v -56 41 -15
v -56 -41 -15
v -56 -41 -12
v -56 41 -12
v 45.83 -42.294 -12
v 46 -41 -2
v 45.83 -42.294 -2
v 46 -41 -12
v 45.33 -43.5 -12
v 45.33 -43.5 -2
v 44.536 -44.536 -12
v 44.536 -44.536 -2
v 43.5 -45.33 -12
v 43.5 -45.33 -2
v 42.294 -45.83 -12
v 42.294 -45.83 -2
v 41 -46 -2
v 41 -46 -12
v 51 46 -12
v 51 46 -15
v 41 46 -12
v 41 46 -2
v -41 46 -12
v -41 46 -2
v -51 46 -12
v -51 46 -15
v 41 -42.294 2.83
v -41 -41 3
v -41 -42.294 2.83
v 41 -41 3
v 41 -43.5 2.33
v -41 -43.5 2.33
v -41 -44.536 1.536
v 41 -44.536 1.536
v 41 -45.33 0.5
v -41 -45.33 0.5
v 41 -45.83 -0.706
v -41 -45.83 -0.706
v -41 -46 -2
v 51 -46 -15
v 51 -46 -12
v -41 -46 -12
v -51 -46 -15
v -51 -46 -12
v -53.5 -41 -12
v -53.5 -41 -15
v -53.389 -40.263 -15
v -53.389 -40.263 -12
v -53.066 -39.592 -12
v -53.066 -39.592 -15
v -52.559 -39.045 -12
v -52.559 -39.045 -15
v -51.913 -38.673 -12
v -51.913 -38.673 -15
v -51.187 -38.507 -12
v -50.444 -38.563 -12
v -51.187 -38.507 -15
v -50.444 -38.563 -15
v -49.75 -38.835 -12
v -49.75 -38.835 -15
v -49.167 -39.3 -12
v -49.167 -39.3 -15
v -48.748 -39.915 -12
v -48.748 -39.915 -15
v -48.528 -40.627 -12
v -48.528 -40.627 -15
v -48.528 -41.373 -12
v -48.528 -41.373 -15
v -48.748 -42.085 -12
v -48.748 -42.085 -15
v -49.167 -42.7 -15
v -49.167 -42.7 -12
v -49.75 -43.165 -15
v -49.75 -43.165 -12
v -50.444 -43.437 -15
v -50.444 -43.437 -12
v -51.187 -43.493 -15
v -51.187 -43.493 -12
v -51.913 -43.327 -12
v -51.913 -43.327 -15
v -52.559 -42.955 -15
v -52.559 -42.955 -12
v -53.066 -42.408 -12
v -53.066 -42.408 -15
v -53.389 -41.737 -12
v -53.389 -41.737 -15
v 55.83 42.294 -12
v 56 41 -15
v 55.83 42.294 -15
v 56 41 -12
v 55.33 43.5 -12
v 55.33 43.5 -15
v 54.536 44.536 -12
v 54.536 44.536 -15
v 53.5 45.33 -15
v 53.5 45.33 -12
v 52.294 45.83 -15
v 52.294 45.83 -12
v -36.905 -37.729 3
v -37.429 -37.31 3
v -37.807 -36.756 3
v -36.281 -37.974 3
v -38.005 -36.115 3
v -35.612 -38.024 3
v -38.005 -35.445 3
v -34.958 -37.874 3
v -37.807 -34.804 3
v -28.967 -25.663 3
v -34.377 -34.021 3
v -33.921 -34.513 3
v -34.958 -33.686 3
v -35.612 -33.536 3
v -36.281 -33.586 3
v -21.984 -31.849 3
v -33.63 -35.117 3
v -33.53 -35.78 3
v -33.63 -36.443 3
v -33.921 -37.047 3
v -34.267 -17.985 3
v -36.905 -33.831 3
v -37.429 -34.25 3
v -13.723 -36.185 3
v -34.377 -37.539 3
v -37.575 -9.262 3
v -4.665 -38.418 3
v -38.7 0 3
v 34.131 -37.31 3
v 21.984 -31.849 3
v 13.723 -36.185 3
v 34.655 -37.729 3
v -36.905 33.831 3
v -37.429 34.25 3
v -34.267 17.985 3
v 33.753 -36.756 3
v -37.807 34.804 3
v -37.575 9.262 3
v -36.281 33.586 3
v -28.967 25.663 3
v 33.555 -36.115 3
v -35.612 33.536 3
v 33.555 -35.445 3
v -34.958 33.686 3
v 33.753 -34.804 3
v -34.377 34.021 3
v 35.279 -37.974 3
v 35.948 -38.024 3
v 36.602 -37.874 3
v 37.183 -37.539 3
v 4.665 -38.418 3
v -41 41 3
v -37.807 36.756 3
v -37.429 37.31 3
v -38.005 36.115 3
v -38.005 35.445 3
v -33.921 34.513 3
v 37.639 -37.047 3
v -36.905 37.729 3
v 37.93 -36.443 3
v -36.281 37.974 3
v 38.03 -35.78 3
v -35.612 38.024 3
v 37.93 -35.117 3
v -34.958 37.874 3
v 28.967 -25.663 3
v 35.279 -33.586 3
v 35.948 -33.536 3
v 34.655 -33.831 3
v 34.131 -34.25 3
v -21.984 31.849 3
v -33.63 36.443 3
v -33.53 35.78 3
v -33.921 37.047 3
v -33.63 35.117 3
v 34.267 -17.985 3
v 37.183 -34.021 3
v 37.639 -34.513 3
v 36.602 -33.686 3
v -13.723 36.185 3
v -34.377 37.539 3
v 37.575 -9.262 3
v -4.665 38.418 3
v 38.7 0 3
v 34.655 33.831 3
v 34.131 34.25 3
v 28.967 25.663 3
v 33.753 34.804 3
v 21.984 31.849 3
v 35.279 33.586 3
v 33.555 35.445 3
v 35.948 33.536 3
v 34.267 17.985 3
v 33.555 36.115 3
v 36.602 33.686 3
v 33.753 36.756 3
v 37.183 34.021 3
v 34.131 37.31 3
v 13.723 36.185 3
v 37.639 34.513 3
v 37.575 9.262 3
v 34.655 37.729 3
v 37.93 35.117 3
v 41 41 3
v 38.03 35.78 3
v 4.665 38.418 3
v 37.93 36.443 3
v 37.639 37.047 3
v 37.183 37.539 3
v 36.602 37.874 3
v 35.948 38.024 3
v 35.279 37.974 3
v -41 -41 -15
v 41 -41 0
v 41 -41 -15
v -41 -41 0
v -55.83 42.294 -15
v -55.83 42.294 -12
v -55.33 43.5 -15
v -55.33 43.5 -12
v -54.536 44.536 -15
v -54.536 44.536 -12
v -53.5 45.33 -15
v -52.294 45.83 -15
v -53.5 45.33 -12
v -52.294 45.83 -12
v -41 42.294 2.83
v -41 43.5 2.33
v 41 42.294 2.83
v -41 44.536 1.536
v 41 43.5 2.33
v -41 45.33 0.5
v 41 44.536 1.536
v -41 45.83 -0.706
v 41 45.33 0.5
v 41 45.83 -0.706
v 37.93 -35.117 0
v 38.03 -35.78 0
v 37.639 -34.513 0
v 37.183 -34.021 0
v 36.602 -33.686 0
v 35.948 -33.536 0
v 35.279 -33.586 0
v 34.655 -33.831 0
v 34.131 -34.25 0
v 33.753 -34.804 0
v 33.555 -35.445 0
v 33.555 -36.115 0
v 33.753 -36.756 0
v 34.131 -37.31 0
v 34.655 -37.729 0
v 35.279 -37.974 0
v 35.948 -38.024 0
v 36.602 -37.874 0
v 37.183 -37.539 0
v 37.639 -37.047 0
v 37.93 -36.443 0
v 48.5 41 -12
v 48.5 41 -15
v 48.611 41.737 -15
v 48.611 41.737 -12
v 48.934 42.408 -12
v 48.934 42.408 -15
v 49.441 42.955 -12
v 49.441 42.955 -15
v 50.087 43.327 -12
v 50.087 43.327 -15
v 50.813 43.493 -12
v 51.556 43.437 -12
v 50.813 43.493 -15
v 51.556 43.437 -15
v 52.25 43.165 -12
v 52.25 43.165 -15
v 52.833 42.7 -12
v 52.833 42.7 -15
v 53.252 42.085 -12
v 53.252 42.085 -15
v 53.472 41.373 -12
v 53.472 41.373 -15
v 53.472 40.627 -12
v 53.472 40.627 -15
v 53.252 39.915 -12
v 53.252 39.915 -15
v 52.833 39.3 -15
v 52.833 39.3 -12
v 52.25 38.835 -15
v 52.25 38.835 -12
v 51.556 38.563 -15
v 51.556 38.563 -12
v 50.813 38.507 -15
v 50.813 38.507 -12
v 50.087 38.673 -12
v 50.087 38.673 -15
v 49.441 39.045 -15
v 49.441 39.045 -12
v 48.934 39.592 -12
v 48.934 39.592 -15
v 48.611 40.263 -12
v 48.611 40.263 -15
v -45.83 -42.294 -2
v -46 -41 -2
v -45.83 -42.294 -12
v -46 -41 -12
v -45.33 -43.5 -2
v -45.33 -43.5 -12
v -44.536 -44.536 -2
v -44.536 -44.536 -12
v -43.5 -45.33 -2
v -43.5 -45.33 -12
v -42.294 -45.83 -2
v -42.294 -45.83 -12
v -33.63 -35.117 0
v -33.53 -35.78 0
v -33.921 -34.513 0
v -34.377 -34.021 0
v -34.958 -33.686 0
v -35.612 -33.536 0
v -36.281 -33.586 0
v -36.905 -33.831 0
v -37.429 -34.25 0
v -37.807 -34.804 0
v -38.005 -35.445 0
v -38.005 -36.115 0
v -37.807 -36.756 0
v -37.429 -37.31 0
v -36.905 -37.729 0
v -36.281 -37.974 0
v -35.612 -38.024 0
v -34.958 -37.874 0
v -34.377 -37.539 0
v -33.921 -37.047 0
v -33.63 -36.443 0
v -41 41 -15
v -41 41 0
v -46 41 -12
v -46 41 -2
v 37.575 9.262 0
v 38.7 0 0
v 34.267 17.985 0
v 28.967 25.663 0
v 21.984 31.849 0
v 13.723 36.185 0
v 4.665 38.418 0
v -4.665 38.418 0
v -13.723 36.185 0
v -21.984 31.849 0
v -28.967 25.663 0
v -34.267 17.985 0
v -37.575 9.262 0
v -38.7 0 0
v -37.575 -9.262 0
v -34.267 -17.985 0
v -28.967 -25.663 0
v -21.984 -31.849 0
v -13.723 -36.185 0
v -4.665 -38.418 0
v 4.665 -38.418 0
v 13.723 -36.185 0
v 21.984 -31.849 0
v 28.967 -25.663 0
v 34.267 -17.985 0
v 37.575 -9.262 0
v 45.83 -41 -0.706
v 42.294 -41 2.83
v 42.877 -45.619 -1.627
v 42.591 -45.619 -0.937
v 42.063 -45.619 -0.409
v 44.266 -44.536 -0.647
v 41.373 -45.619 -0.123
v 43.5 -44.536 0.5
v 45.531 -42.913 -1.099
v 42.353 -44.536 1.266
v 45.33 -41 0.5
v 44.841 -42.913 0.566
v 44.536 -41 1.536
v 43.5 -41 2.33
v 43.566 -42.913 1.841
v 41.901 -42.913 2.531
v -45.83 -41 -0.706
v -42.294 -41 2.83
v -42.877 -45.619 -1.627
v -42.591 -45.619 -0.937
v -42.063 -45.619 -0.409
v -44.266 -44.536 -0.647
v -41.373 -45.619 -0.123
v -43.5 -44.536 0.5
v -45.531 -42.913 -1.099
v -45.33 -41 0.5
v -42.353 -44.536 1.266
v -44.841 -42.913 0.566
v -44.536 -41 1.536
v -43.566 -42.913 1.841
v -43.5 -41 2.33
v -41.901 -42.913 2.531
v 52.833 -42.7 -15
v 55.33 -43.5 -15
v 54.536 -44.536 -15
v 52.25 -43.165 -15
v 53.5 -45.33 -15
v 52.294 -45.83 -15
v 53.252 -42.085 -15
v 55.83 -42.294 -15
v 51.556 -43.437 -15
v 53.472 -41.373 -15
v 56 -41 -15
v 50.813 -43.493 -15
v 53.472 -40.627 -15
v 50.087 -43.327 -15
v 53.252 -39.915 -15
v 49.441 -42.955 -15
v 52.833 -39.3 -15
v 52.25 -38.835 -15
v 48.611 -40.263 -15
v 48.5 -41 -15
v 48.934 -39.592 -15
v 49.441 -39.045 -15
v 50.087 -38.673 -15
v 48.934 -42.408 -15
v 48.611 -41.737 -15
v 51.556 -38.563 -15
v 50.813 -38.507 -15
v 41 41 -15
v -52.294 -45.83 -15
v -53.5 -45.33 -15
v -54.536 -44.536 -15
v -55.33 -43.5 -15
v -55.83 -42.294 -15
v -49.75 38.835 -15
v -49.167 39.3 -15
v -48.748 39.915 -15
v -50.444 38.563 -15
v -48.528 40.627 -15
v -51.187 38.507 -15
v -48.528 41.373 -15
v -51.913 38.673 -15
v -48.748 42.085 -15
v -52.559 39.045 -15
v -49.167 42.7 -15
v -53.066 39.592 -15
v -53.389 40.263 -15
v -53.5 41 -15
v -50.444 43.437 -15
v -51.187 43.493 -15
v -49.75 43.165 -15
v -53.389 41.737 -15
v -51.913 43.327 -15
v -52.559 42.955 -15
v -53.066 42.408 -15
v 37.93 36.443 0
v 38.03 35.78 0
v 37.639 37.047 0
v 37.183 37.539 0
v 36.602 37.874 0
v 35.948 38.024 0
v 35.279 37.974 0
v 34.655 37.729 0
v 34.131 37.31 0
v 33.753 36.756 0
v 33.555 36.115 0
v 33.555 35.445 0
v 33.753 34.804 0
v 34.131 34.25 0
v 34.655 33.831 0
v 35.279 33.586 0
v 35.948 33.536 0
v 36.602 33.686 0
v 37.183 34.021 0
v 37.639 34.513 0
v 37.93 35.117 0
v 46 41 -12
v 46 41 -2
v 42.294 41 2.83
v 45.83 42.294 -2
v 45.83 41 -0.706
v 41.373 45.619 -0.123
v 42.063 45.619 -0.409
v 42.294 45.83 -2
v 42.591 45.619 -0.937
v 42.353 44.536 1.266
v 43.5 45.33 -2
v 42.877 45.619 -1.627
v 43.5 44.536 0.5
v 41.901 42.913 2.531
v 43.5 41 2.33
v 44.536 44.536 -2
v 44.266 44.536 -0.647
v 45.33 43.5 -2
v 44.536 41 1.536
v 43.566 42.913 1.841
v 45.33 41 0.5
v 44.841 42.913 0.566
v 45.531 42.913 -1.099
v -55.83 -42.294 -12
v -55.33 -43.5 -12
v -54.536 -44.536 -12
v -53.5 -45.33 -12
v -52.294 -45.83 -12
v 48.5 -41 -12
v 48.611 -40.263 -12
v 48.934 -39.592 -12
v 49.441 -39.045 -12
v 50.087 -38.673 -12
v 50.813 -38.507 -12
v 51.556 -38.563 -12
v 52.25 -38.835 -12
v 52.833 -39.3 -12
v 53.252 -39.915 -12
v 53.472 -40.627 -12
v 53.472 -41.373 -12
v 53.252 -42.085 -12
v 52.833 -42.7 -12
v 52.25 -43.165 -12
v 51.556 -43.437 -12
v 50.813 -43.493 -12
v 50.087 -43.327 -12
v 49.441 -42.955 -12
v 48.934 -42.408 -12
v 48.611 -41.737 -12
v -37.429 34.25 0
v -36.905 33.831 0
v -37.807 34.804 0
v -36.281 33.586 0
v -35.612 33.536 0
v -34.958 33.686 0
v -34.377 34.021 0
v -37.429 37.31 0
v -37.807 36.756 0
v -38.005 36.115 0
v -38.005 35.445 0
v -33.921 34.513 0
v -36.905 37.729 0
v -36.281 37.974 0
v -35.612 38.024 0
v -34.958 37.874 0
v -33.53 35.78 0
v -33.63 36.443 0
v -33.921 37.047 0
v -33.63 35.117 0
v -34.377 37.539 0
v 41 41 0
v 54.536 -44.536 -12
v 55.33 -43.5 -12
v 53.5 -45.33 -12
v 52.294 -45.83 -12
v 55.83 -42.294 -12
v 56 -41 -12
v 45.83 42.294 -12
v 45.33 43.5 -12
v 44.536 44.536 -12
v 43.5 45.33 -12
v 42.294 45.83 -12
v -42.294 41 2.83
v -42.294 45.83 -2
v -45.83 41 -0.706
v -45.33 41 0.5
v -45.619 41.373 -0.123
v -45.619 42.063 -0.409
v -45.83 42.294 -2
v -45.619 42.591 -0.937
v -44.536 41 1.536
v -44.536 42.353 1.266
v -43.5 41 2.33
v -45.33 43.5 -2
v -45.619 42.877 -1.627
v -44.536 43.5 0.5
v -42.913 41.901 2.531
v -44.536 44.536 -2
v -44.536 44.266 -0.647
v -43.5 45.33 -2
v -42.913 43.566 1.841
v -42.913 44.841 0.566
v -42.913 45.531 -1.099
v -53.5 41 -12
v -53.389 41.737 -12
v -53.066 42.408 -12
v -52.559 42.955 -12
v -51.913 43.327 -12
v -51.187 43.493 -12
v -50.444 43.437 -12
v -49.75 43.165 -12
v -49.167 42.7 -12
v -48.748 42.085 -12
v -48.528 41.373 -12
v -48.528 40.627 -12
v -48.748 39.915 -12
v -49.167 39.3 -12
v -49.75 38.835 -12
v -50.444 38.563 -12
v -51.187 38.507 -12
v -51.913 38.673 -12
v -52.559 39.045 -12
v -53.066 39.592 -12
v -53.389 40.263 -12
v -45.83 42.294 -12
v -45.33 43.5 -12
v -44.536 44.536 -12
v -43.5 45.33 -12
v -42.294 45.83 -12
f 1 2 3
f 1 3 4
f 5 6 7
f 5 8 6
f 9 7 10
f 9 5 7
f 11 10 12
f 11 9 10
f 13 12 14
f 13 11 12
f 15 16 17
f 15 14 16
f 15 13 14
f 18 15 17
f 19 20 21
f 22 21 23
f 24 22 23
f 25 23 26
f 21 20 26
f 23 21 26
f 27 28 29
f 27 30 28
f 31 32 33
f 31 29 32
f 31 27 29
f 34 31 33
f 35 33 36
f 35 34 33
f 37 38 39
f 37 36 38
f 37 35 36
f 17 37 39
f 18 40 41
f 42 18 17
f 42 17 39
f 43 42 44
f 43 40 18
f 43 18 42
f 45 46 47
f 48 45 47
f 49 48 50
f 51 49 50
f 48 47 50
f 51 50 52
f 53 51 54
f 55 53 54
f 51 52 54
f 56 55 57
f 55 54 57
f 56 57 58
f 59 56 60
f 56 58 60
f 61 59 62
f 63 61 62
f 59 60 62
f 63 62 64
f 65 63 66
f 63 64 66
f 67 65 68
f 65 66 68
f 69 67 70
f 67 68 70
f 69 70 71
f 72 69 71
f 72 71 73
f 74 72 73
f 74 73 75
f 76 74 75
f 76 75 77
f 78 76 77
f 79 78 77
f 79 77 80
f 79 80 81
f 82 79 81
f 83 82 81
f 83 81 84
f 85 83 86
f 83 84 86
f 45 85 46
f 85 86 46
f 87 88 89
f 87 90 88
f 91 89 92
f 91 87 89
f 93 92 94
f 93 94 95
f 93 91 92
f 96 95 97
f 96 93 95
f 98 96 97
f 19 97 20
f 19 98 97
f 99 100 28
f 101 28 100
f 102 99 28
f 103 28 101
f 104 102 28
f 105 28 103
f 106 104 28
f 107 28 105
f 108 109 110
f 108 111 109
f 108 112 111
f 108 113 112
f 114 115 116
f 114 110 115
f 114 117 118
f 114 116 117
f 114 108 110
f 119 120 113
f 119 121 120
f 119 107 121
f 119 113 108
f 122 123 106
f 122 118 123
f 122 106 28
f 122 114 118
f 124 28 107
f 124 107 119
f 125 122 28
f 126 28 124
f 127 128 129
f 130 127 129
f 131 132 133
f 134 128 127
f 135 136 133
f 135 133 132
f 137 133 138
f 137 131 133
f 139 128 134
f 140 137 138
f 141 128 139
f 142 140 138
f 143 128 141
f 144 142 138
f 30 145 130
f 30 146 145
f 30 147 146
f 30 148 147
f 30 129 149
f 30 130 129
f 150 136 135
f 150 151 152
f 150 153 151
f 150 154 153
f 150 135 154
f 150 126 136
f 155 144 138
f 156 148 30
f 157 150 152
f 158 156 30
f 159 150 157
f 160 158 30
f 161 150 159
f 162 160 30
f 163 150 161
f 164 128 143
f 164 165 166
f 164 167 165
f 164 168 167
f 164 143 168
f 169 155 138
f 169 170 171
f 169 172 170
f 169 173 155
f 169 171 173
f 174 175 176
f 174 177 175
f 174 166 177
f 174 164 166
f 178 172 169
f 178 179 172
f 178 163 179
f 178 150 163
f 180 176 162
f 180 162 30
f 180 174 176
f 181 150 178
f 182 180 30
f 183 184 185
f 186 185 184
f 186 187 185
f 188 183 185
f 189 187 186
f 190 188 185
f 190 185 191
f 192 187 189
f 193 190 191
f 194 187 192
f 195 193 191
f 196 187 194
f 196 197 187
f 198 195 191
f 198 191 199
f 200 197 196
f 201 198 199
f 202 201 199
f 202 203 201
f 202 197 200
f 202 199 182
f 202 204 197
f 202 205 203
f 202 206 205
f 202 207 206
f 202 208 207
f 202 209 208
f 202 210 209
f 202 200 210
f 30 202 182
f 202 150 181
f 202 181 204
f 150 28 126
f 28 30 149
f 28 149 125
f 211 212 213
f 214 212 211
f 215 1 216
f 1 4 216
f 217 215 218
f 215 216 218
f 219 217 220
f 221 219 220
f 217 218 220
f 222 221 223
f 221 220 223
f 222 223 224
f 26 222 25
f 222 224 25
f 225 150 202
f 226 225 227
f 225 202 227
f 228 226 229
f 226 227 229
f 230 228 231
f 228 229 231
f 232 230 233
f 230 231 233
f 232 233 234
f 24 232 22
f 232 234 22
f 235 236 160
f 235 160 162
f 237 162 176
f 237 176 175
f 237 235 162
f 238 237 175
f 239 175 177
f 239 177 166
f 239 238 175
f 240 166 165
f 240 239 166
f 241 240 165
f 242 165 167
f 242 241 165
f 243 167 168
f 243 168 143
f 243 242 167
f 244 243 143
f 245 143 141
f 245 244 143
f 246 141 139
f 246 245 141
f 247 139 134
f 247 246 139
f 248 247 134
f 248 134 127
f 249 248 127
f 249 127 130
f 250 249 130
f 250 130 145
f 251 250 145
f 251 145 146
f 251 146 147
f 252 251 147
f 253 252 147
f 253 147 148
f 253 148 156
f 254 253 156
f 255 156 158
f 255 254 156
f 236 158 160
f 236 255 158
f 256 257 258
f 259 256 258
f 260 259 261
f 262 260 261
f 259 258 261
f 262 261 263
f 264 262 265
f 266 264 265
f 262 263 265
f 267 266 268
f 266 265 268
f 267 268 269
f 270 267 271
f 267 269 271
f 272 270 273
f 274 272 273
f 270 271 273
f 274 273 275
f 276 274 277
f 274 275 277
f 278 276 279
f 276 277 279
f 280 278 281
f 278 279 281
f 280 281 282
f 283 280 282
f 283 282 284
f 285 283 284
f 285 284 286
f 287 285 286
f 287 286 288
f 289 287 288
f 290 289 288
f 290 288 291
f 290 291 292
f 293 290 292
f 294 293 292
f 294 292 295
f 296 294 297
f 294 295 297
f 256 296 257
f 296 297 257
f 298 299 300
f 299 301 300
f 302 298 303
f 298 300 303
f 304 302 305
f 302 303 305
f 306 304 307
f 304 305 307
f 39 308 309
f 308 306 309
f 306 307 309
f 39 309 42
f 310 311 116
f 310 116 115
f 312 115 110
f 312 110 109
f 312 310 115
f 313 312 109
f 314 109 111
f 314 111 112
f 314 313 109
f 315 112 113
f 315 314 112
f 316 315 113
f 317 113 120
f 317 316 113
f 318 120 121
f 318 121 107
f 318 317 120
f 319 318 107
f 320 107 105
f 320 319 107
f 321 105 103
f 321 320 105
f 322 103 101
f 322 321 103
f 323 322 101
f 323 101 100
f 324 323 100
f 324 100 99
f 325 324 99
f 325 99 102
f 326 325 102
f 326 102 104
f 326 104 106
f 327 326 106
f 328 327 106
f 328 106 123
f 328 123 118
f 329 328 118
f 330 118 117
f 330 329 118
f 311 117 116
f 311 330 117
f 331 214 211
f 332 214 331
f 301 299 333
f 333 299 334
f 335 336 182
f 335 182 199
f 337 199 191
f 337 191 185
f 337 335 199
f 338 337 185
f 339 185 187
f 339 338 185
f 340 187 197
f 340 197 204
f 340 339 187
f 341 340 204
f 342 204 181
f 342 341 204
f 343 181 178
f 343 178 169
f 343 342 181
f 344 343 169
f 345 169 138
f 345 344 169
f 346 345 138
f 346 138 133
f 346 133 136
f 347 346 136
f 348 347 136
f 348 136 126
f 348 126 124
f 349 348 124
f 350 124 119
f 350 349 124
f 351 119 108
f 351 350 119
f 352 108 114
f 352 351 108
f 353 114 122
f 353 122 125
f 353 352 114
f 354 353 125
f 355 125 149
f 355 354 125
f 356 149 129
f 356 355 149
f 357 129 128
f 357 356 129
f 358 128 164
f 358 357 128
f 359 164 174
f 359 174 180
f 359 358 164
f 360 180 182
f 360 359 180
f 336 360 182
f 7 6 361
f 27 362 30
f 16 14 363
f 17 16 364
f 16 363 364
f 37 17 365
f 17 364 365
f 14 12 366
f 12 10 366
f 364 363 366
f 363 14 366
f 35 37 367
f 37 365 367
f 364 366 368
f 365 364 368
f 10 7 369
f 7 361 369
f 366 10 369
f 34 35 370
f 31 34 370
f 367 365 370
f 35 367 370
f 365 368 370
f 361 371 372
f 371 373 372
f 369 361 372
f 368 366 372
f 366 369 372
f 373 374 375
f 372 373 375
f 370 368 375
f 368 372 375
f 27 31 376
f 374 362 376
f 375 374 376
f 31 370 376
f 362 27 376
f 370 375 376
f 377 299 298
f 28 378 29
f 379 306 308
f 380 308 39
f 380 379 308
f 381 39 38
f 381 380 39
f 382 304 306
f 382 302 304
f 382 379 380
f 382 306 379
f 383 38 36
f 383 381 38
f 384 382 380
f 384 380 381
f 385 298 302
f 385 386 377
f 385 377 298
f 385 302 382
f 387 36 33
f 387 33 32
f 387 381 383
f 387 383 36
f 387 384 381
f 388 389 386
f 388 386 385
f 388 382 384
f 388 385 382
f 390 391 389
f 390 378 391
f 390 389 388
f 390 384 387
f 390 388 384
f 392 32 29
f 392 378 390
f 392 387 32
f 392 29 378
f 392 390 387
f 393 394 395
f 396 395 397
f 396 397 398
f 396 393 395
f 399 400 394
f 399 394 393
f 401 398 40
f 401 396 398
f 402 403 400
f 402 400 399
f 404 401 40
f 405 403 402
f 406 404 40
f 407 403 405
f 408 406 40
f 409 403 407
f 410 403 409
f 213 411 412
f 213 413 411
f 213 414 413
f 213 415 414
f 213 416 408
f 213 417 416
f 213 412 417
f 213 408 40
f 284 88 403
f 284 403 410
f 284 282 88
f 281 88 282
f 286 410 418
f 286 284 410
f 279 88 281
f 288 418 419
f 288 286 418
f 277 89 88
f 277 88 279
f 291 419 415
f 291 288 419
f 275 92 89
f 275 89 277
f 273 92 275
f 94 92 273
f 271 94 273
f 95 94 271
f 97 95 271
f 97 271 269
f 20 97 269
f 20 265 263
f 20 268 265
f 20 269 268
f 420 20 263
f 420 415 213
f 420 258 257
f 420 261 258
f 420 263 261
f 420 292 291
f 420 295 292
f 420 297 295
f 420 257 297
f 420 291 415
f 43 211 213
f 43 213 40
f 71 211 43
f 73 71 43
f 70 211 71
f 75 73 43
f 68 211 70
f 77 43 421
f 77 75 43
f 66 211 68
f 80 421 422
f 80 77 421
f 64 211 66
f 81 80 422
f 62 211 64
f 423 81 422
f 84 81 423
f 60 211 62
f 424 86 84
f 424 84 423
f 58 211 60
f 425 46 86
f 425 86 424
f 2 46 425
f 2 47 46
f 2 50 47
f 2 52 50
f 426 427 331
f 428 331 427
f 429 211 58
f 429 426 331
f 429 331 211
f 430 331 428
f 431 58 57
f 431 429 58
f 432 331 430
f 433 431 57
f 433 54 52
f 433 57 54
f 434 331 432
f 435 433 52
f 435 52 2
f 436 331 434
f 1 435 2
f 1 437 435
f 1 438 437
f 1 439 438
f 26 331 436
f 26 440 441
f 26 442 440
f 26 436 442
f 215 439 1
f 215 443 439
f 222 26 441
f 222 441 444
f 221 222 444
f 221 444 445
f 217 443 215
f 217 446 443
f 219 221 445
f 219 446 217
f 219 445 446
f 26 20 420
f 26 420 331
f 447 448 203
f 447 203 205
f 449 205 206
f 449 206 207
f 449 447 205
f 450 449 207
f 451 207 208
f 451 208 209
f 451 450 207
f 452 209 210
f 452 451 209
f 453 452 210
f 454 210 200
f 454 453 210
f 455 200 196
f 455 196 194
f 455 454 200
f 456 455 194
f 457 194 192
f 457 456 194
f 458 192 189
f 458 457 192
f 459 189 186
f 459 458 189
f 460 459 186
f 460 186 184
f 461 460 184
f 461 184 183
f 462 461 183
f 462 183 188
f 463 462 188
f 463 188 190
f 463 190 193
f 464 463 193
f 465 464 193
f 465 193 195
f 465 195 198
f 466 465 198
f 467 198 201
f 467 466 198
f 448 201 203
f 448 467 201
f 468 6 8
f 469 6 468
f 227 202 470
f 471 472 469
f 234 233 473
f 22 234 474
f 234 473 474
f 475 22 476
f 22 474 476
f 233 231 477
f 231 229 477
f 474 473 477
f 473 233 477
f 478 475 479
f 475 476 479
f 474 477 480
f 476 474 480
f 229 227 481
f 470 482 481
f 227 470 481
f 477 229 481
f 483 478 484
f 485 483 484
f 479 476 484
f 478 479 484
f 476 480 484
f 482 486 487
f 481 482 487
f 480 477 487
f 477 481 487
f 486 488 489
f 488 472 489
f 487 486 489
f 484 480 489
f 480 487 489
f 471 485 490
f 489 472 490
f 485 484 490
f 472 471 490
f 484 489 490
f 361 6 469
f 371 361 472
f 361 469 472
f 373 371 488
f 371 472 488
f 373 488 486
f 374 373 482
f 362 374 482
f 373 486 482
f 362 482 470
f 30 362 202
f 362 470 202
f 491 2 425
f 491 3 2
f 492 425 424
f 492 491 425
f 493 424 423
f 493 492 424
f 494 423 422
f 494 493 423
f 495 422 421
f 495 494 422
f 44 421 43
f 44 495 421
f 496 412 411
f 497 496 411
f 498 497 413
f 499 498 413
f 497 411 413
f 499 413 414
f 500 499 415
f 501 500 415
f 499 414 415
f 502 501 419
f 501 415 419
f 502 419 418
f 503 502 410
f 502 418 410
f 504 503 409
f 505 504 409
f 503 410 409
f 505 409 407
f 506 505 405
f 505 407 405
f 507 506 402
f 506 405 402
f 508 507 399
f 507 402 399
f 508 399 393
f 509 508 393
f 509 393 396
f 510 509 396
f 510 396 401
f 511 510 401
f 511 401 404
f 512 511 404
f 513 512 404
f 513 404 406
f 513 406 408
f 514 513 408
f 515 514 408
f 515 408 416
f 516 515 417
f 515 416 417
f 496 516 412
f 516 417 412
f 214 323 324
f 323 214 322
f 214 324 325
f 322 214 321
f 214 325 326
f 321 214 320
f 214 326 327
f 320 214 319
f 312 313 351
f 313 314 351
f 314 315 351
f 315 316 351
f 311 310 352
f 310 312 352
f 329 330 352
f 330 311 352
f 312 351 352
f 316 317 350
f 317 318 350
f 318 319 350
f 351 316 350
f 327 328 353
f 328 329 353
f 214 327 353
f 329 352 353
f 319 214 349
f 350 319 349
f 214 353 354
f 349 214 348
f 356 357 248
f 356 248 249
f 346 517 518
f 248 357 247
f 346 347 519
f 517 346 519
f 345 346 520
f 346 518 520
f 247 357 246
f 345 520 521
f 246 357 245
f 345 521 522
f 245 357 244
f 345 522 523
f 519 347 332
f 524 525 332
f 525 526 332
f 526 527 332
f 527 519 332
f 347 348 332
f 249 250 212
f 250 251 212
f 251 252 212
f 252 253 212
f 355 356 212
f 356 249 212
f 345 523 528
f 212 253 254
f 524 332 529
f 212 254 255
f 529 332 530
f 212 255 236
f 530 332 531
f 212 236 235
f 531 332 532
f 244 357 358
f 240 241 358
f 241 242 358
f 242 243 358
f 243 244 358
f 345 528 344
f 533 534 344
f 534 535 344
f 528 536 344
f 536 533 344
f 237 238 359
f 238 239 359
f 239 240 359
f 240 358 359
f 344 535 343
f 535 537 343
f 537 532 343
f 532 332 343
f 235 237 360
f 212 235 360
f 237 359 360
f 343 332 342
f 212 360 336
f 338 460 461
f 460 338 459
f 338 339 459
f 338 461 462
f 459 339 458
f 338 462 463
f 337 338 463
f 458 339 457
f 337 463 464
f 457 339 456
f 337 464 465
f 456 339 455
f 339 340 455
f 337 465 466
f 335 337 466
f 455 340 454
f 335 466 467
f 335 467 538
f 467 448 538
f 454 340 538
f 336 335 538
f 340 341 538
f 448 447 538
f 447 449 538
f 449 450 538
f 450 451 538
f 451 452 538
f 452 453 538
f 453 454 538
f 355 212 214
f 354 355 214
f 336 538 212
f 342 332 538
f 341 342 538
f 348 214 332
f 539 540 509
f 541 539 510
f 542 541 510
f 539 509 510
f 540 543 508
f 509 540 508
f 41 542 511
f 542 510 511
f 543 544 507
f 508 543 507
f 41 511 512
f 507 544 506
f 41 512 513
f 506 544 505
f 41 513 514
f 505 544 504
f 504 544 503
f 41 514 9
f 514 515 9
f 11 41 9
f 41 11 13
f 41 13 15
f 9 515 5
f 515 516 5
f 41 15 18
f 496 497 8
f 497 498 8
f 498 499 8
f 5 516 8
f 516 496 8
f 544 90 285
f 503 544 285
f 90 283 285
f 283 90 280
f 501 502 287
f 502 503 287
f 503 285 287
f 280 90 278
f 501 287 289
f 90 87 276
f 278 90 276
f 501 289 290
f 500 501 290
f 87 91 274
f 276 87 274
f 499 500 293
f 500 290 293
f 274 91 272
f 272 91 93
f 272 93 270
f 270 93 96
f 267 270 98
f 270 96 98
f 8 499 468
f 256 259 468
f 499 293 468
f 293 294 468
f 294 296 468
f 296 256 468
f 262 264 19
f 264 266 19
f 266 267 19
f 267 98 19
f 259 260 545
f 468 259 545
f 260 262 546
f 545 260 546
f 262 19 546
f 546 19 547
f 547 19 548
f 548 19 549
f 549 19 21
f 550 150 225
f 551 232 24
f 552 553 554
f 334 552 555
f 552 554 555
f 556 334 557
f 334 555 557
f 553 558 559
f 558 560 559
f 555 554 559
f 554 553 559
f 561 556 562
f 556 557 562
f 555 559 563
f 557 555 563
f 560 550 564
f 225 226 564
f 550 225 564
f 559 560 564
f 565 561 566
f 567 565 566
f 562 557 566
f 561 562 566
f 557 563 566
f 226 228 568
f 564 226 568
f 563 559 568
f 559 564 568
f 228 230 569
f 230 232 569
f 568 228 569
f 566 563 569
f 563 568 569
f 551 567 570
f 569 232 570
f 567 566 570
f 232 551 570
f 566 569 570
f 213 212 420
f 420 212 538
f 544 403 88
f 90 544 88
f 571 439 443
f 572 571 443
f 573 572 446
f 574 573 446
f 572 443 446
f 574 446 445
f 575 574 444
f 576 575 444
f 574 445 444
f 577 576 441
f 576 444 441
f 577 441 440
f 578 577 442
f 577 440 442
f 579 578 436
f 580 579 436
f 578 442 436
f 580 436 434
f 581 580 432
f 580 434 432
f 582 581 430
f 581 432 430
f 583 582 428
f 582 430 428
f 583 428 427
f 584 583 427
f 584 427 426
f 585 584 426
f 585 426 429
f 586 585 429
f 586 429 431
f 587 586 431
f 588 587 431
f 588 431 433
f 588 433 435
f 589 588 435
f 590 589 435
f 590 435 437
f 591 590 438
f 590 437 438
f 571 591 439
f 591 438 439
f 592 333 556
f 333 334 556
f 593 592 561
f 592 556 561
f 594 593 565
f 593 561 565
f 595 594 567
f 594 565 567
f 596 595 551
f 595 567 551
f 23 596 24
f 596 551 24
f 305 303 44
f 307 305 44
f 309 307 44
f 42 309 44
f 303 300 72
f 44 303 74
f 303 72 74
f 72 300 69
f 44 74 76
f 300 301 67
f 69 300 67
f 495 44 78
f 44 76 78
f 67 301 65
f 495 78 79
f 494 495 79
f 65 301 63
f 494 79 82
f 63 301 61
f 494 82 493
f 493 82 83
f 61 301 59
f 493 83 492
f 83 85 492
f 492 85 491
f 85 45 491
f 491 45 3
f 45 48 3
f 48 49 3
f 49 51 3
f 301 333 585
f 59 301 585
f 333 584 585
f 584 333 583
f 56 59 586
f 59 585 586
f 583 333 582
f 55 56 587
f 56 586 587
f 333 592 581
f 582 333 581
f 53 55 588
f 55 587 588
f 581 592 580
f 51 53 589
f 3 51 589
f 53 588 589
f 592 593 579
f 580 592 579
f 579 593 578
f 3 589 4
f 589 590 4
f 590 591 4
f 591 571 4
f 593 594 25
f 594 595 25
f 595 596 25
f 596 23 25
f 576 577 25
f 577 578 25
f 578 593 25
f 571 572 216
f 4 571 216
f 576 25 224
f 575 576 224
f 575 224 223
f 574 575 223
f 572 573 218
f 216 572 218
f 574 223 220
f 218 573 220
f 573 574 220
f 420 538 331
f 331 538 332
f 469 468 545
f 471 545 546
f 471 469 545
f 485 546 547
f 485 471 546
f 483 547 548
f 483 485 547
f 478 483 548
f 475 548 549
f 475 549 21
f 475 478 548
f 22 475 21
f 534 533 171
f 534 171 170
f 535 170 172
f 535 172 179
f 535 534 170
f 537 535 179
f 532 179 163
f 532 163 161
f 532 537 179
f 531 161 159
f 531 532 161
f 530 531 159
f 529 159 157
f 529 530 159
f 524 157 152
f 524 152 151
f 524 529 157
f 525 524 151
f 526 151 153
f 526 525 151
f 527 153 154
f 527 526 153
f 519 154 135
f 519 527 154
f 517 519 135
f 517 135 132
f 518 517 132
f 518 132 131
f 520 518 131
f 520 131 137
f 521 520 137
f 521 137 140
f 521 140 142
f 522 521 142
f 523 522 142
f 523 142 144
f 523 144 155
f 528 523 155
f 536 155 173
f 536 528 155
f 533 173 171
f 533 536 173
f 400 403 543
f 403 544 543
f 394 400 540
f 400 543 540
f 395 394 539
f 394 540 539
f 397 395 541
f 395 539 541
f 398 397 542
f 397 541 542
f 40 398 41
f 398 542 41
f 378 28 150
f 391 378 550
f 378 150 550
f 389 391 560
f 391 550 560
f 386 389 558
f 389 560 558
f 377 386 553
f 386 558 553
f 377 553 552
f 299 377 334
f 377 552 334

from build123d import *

# Parameters (mm, degrees)
SKETCH1_W           = 92
SKETCH1_H           = 92
SKETCH1_R           = 38.7
SKETCH1_R_2         = 2.25
BOSS_EXTRUDE1_DEPTH = 3
SKETCH2_W           = 92
SKETCH2_H           = 92
SKETCH2_W_2         = 82
SKETCH2_H_2         = 82
BOSS_EXTRUDE2_DEPTH = 15
SKETCH3_W           = 10
SKETCH3_H           = 92
SKETCH3_R           = 2.5
BOSS_EXTRUDE3_DEPTH = 3
FILLET1_R           = 5


with BuildPart() as part:
    # Sketch1 → Boss-Extrude1 (new body)
    with BuildSketch(Plane.XY):
        Rectangle(SKETCH1_W, SKETCH1_H)
        Circle(SKETCH1_R, mode=Mode.SUBTRACT)
        with Locations((-35.78, 35.78)):
            Circle(SKETCH1_R_2, mode=Mode.SUBTRACT)
        with Locations((35.78, 35.78)):
            Circle(SKETCH1_R_2, mode=Mode.SUBTRACT)
        with Locations((35.78, -35.78)):
            Circle(SKETCH1_R_2, mode=Mode.SUBTRACT)
        with Locations((-35.78, -35.78)):
            Circle(SKETCH1_R_2, mode=Mode.SUBTRACT)
    extrude(amount=BOSS_EXTRUDE1_DEPTH)

    # Sketch2 → Boss-Extrude2 (add)
    with BuildSketch(Plane(origin=(0, 0, 0), x_dir=(-1, 0, 0), z_dir=(0, 0, -1))):
        Rectangle(SKETCH2_W, SKETCH2_H)
        Rectangle(SKETCH2_W_2, SKETCH2_H_2, mode=Mode.SUBTRACT)
    extrude(amount=BOSS_EXTRUDE2_DEPTH)

    # Sketch3 → Boss-Extrude3 (add)
    # profile 1 of 2: a face of its own
    with BuildSketch(Plane(origin=(0, 0, -15), x_dir=(-1, 0, 0), z_dir=(0, 0, -1))):
        with Locations((-51, 0)):
            Rectangle(SKETCH3_W, SKETCH3_H)
        with Locations((-51, 41)):
            Circle(SKETCH3_R, mode=Mode.SUBTRACT)
        with Locations((-51, -41)):
            Circle(SKETCH3_R, mode=Mode.SUBTRACT)
    # profile 2 of 2: a face of its own
    with BuildSketch(Plane(origin=(0, 0, -15), x_dir=(-1, 0, 0), z_dir=(0, 0, -1))):
        with Locations((51, 0)):
            Rectangle(SKETCH3_W, SKETCH3_H)
        with Locations((51, 41)):
            Circle(SKETCH3_R, mode=Mode.SUBTRACT)
        with Locations((51, -41)):
            Circle(SKETCH3_R, mode=Mode.SUBTRACT)
    extrude(amount=-BOSS_EXTRUDE3_DEPTH)

    # Fillet1
    fillet1_edges = [part.edges().sort_by_distance(p)[0] for p in [
        (46, 0, 3),
        (0, 46, 3),
        (-46, 0, 3),
        (56, -46, -13.5),
        (56, 46, -13.5),
        (-56, 46, -13.5),
        (-56, -46, -13.5),
        (-46, 46, -4.5),
        (46, 46, -4.5),
        (46, -46, -4.5),
        (-46, -46, -4.5),
        (0, -46, 3),
    ]]
    fillet(fillet1_edges, radius=FILLET1_R)


solid = part.part
